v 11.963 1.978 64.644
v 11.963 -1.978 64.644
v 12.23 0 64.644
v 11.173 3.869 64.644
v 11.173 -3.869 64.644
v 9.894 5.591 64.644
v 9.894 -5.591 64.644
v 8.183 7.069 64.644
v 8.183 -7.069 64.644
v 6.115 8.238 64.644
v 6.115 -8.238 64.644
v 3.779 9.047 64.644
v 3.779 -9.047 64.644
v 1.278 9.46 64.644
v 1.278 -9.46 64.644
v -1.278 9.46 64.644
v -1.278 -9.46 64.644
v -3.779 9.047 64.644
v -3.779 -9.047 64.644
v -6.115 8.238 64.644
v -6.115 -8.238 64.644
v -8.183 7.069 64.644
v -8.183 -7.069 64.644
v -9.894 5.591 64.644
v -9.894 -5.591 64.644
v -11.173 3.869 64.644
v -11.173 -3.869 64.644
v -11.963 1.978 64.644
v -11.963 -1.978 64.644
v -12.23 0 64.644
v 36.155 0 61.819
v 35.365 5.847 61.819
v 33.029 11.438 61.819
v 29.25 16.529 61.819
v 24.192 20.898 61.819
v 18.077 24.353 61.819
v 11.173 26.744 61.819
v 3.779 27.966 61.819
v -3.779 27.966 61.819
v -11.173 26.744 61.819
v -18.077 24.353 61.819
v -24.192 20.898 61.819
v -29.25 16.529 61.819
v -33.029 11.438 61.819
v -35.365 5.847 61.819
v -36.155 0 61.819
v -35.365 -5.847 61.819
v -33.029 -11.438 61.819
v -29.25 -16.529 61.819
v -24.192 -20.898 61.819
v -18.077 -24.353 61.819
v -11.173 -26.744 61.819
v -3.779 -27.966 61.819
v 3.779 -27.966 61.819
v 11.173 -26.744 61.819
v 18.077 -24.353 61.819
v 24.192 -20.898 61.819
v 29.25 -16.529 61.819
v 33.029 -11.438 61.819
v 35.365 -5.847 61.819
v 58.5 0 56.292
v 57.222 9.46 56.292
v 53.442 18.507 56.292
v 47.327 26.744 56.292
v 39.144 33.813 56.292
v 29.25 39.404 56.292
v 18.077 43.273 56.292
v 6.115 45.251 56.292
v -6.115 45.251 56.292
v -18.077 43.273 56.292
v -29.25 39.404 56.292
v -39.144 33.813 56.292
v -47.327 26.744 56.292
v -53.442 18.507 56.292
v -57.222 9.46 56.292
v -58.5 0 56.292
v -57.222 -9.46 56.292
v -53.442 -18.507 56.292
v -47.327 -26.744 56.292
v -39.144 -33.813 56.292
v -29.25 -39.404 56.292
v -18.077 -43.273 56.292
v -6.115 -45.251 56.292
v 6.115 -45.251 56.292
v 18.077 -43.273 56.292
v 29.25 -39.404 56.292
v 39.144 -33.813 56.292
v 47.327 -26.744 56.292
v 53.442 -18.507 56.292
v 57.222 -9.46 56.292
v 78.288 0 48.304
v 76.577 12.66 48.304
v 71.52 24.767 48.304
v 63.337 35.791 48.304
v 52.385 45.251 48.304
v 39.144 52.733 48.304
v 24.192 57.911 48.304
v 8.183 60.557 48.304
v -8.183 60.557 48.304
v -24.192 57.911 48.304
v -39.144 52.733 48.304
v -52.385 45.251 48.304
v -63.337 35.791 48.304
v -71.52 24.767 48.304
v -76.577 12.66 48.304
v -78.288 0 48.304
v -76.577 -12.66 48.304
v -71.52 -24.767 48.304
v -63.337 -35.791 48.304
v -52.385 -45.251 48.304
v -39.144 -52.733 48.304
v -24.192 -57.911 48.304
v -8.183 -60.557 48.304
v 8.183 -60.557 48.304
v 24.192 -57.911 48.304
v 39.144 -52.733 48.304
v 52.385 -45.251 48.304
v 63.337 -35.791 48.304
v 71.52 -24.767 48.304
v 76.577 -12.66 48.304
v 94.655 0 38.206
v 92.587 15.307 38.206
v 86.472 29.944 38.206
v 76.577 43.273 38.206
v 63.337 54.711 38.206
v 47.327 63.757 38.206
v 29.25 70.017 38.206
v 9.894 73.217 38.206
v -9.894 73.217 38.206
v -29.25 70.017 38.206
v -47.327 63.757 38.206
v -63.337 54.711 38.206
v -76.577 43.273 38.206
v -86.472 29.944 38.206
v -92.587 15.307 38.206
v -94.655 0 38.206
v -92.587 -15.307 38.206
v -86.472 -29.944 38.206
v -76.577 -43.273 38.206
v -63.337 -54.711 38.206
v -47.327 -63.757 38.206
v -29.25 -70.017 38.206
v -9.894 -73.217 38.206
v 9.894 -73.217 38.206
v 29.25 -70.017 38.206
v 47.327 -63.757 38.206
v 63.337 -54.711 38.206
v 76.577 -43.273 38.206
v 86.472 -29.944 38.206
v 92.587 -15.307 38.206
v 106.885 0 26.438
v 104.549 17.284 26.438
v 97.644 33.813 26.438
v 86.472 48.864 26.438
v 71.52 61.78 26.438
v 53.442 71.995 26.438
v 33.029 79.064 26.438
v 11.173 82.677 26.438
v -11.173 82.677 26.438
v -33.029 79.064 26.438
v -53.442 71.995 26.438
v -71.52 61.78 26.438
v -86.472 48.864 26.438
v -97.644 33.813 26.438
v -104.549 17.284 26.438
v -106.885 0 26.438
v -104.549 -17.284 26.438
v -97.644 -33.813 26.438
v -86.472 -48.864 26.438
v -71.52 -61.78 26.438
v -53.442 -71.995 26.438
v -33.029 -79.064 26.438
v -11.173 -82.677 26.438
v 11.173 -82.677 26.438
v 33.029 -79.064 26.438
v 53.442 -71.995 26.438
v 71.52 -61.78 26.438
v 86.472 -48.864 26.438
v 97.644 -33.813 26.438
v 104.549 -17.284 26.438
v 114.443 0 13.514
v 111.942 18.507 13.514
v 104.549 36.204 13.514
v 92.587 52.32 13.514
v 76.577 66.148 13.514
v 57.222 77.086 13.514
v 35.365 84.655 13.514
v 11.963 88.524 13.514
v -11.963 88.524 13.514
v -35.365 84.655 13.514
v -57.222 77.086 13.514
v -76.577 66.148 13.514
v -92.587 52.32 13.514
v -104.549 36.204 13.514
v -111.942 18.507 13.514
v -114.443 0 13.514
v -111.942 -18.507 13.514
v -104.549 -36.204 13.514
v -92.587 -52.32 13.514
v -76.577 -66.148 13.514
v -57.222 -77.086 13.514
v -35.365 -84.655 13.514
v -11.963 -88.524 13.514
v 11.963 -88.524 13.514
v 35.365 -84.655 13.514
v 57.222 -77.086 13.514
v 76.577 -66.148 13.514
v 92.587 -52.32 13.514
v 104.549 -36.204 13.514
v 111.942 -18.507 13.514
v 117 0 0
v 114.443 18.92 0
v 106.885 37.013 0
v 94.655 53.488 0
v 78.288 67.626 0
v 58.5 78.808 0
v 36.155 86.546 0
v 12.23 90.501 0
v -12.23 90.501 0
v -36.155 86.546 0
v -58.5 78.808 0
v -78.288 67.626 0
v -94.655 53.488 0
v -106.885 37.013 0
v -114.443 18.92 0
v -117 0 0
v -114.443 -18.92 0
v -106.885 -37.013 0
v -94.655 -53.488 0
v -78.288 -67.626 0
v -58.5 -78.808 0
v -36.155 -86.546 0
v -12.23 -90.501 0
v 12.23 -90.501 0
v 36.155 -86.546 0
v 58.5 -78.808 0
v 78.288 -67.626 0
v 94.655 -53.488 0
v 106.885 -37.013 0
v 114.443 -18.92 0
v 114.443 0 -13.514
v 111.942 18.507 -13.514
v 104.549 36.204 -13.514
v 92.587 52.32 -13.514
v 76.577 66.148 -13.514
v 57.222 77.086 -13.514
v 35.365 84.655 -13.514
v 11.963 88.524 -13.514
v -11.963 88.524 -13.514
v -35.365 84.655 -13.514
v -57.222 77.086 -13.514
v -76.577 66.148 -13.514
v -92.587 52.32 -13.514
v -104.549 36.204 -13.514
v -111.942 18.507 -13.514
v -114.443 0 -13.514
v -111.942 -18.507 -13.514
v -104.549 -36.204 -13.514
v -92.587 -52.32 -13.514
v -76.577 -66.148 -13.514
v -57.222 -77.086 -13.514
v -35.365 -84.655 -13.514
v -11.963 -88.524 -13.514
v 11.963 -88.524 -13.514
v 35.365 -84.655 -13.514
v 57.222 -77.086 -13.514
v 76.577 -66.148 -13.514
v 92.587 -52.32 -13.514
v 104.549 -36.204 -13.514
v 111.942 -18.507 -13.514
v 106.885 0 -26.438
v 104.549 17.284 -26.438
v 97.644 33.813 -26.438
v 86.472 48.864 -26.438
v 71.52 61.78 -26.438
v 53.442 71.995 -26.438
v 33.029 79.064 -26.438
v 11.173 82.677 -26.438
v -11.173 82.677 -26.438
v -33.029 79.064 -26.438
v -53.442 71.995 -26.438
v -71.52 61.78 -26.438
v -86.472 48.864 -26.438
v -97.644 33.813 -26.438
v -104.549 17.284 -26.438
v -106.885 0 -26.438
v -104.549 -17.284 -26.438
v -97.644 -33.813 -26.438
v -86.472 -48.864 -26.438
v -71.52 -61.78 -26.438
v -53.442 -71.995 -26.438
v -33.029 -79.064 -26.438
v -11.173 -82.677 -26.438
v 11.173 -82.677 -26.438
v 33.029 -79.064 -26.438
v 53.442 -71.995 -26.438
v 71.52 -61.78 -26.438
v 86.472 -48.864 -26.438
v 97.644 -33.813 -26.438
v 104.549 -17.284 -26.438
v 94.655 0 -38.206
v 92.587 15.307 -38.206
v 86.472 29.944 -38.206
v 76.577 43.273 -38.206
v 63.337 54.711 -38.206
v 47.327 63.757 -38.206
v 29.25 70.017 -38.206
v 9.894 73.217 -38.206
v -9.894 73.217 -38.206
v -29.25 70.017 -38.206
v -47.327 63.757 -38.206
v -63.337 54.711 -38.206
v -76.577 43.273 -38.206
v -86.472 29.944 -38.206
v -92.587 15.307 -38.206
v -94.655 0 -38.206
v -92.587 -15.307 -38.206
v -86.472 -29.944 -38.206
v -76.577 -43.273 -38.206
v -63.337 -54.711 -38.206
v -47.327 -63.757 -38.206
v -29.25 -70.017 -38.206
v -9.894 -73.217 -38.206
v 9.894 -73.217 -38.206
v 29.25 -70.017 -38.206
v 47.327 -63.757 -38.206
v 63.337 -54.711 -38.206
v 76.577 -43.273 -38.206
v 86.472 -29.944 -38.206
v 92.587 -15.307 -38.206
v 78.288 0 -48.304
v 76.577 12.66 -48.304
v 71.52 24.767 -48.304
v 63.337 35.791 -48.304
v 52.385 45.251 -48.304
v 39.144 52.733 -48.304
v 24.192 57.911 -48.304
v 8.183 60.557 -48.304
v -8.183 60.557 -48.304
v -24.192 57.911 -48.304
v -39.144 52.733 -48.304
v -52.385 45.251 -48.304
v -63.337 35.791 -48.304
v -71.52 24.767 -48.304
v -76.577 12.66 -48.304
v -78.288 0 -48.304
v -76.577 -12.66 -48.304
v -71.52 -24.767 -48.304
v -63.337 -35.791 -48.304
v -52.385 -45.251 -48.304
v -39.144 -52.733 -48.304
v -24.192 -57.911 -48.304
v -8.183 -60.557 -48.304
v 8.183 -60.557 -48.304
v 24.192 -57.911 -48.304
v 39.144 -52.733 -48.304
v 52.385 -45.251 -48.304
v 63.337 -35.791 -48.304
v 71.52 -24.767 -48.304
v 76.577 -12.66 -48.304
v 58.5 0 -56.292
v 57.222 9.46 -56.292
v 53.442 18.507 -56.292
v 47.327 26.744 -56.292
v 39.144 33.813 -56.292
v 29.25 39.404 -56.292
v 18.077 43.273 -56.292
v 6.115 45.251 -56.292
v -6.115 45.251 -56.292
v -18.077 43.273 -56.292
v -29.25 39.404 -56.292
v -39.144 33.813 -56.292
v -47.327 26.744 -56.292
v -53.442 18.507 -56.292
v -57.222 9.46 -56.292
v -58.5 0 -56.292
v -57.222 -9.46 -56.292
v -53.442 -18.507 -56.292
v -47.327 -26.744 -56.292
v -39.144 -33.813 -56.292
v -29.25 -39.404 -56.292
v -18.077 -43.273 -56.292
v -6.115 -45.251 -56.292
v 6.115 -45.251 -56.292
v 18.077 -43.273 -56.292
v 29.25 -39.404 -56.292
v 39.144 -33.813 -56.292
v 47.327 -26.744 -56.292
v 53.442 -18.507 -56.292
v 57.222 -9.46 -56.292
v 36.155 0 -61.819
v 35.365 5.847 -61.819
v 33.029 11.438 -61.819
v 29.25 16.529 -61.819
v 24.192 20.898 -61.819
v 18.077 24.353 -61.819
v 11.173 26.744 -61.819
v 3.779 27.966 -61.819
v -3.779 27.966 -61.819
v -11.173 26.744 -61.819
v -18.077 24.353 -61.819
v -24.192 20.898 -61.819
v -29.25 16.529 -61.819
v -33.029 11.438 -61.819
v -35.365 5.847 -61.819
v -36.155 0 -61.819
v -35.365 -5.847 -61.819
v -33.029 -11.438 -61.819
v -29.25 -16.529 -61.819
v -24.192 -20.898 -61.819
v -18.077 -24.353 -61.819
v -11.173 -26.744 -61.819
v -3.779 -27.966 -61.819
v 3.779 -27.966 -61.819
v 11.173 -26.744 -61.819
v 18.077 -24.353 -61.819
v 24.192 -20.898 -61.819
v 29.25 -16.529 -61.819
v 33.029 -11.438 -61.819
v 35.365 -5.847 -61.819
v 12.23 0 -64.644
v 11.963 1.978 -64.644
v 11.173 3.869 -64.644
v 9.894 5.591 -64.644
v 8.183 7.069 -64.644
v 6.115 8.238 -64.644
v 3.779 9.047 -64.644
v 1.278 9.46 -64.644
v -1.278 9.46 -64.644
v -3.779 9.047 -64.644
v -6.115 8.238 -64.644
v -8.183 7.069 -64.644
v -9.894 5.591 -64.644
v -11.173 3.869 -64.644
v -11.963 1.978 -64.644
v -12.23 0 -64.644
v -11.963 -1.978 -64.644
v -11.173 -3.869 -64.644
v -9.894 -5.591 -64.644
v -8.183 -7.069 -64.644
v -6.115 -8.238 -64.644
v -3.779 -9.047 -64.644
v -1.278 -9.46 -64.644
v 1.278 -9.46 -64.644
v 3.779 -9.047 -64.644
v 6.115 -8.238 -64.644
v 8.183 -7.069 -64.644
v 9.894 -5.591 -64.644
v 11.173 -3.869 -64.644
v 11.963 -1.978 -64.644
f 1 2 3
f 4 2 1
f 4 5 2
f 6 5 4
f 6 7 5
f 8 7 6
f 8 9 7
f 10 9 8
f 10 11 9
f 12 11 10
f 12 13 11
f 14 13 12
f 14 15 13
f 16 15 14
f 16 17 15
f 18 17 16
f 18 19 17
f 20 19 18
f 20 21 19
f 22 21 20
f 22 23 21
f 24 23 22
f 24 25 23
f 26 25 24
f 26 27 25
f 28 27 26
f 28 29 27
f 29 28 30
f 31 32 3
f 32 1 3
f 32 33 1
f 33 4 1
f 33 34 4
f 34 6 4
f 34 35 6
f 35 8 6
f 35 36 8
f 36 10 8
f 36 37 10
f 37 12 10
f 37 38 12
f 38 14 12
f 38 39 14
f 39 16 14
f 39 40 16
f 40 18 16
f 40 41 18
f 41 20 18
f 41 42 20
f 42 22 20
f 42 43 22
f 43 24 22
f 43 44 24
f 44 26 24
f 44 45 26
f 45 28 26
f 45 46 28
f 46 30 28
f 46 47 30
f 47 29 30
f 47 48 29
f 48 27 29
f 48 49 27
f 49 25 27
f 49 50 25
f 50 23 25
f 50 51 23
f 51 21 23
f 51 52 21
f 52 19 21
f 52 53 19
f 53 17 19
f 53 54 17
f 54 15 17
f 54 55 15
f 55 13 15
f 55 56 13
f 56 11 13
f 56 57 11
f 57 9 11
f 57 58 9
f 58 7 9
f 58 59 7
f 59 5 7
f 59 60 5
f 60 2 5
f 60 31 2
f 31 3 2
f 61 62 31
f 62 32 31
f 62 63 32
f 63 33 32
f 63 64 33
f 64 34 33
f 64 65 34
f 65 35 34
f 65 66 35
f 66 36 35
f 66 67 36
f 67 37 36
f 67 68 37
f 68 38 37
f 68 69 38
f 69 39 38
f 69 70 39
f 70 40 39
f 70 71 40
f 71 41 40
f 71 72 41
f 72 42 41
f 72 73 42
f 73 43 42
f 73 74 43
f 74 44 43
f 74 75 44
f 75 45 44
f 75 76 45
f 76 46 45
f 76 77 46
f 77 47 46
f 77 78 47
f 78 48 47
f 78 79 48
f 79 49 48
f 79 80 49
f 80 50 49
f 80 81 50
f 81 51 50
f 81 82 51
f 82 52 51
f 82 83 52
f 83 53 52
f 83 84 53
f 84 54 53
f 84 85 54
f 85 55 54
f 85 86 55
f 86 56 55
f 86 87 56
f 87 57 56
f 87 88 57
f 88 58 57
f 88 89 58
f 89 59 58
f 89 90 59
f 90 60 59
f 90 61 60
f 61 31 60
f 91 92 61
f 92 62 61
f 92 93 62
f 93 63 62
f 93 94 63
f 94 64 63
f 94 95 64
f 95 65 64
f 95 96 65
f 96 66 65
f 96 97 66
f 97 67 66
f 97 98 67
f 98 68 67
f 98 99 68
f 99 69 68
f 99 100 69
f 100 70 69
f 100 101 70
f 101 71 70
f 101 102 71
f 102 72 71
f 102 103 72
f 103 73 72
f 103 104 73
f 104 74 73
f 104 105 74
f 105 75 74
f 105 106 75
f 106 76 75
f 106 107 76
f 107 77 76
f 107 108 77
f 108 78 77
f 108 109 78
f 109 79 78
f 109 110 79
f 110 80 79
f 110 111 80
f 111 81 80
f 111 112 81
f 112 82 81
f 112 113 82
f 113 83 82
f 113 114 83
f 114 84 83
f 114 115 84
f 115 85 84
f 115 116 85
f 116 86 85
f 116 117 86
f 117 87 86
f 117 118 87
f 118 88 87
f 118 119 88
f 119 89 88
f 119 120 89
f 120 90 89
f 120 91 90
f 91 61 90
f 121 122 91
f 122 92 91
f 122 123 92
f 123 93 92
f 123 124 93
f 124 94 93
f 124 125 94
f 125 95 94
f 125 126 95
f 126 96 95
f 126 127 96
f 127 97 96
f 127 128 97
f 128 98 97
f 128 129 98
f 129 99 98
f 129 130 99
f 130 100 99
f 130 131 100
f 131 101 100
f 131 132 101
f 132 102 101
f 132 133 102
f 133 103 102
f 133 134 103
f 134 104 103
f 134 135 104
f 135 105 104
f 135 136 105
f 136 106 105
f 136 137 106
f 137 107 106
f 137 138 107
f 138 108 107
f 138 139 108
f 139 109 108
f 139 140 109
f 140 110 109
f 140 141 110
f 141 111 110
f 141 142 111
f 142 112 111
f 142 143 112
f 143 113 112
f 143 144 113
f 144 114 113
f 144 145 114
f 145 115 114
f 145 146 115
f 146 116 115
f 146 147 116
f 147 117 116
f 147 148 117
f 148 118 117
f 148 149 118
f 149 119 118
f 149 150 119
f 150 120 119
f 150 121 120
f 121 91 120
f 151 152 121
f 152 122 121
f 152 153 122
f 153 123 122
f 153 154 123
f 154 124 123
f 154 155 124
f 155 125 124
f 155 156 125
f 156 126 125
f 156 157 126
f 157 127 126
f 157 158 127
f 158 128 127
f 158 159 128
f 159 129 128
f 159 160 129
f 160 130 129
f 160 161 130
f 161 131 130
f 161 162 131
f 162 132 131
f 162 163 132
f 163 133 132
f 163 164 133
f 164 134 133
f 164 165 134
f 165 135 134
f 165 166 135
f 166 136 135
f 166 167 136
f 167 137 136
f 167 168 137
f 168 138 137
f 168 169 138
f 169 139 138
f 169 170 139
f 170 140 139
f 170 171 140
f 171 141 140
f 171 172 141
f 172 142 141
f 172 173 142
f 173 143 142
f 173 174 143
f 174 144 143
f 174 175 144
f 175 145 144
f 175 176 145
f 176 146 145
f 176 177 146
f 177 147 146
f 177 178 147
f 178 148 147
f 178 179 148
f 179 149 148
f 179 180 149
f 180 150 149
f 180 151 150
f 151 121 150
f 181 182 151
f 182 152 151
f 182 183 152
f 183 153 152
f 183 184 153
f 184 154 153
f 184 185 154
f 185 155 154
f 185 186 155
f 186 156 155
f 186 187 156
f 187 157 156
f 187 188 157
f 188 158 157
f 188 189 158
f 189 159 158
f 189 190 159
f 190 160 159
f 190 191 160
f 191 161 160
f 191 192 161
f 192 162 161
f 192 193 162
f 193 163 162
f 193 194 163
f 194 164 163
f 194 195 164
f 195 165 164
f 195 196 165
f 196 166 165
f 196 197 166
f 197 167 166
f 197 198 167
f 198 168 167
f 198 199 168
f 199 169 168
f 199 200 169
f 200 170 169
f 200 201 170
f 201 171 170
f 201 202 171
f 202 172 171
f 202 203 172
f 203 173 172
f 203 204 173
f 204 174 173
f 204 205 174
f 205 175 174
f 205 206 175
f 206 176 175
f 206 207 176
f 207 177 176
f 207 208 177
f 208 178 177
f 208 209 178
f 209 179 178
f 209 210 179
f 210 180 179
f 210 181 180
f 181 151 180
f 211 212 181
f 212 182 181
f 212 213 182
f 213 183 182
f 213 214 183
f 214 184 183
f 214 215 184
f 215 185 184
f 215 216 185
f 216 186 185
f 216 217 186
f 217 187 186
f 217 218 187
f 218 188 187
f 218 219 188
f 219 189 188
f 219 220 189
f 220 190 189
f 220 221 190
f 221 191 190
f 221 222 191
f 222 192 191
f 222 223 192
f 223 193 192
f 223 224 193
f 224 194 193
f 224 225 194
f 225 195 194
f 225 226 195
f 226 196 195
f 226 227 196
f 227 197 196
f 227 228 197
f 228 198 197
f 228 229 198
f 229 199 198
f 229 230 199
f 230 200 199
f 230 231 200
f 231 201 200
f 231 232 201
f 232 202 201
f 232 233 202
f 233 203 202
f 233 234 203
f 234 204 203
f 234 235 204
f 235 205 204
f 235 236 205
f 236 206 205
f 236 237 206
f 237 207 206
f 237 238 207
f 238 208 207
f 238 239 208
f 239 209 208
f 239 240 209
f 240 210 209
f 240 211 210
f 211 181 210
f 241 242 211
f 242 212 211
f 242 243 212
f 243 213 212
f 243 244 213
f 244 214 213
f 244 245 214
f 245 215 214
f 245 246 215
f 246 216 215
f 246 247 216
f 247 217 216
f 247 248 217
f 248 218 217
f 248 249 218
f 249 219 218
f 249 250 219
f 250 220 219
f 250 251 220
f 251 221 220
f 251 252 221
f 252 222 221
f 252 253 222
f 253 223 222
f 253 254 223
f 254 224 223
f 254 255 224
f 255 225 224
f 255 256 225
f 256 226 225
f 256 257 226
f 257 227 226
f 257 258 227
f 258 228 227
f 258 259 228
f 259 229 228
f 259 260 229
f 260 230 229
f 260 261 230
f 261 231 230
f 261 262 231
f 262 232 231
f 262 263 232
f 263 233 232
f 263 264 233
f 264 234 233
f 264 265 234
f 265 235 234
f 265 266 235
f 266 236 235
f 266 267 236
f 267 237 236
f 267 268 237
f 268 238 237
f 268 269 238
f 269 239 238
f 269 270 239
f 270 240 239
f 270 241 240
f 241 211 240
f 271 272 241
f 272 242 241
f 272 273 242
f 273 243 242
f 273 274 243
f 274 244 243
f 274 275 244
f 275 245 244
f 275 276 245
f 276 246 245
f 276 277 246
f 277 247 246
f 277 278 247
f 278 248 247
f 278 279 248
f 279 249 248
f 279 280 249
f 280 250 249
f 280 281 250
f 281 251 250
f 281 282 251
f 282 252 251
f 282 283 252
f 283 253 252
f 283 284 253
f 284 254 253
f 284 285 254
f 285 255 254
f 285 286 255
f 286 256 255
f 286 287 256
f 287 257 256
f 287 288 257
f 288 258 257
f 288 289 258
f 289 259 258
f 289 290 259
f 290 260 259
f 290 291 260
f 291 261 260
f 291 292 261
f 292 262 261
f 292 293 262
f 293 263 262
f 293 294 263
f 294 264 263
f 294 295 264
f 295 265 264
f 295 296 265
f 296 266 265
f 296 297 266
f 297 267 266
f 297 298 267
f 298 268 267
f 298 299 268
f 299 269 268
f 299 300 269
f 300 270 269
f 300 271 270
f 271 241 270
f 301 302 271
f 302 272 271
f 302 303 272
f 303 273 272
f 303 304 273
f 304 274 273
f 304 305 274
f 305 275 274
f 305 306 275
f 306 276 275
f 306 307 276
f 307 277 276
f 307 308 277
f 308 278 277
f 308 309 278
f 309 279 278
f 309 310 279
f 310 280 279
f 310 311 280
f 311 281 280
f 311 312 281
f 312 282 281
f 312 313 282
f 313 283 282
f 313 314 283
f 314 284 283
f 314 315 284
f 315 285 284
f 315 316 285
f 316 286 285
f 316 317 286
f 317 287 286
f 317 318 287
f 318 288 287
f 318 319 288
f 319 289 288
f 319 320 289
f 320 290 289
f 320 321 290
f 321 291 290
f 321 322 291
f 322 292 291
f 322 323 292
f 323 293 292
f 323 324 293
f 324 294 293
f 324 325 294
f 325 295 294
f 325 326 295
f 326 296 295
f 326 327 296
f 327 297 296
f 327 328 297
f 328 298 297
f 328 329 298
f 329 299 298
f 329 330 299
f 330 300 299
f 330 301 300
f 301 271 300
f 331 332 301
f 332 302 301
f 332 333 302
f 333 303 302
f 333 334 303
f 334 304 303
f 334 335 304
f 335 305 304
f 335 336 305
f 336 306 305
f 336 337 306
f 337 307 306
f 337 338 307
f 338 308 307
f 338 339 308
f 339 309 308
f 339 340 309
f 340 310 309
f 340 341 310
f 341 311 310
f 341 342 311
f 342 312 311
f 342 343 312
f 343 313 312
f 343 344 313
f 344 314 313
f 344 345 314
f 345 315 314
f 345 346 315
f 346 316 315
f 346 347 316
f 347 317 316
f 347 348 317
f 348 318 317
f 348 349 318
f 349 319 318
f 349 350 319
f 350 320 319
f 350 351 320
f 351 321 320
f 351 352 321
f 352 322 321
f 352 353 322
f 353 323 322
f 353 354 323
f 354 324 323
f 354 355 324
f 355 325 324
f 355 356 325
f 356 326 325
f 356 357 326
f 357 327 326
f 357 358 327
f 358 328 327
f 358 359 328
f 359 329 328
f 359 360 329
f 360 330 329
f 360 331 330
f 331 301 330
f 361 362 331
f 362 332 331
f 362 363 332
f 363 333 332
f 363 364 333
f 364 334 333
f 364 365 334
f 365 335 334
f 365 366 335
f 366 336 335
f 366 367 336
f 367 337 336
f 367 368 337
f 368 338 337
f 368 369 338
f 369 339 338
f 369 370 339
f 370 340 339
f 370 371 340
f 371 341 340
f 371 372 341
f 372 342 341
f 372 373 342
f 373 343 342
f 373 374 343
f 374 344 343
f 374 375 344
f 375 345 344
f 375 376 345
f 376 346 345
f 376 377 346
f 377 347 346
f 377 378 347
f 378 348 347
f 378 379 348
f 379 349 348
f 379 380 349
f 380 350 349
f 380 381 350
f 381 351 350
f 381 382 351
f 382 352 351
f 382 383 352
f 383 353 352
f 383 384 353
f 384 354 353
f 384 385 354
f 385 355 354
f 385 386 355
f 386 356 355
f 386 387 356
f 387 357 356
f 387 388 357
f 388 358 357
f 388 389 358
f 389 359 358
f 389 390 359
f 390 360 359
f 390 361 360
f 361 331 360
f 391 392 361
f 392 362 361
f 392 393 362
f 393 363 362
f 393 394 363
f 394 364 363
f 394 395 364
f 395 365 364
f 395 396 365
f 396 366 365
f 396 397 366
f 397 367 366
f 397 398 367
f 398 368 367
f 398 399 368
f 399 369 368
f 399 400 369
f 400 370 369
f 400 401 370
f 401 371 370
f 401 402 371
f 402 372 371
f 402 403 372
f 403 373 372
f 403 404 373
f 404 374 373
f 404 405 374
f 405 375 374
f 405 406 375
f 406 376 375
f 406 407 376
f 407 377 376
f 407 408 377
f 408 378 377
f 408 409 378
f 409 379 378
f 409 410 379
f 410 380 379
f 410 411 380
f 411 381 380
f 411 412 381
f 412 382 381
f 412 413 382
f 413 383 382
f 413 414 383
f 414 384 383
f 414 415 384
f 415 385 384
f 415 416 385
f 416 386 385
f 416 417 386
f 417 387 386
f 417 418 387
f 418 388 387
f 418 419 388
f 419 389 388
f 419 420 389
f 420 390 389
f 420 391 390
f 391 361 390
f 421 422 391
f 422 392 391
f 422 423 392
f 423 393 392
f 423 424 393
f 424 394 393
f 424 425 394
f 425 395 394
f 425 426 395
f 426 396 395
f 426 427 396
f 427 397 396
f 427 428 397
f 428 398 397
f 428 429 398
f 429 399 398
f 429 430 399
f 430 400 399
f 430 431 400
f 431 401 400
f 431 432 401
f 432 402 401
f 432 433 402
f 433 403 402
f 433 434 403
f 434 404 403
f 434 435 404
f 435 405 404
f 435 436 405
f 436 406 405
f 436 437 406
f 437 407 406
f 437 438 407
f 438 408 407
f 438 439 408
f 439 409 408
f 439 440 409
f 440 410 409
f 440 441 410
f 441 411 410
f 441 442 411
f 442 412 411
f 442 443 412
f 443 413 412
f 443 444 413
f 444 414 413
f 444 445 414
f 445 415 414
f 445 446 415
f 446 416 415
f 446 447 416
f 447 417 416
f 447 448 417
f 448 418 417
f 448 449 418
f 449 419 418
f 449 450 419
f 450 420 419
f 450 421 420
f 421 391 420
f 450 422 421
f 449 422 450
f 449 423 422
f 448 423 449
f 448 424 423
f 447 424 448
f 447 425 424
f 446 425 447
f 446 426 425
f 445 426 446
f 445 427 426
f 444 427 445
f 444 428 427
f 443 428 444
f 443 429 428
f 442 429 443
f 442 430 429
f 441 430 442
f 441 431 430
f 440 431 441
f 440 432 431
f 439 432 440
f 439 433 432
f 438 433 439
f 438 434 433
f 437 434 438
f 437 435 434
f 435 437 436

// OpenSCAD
// Generated by SolidPython 1.0.1 on 2020-07-29 00:46:48


scale(v = [9, 7, 5]) {
	sphere(r = 13);
}
/***********************************************
*********      SolidPython code:      **********
************************************************
 
# import packages: SolidPython
from solid import *
from solid.utils import *
from itertools import chain, combinations, permutations


class Resize:

    def __init__(self, scad_file):
        self.scad_file = scad_file
        #self.scad_file = import_scad(scad_file)
        # cone/cylinder param:
        self.r1 = 0
        self.r2 = 0
        self.h = 0
        # rectangular prism param:
        self.w = 0
        self.l = 0
        # ellipse param:
        self.r = 0

    # import OpenScad code (file name corresponds to shape)


    # classify shape + parameters
    def assign(self, param1, param2, param3):
        if self.scad_file == 'cone.scad':
            self.r1 = param1
            self.r2 = param2
            self.h = param3
        elif self.scad_file == 'cylinder.scad':
            self.r1 = param1
            self.r2 = param2
            self.h = param3
        elif self.scad_file == 'rectangularPrism.scad':
            self.h = param1
            self.l = param2
            self.w = param3
        else:
            self.r = param1
            self.h = param2

    # resize parameters
    def iterate(self):
        x = range(3, 20, 2)
        i = 1
        if self.scad_file == 'cone.scad':
            tempList = list(permutations(x, 2))
            for temp in tempList:
                param1 = temp[0]
                param2 = temp[1]
                filepath = 'produced_scad_files/' + 'cone' + str(param1) + '_' + str(param2) + '_' + '.scad'
                scad_render_to_file(cylinder(h=param1, r1=param2, r2=0), filepath)

        elif self.scad_file == 'cylinder.scad':
            tempList = list(permutations(x, 3))
            for temp in tempList:
                param1 = temp[0]
                param2 = temp[1]
                filepath = 'produced_scad_files/' + 'cylinder' + str(param1) + '_' + str(param2) + '_' + '.scad'
                scad_render_to_file(cylinder(h=param1, r1=param2, r2=param2), filepath)

        elif self.scad_file == 'rectangularPrism.scad':
            tempList = list(permutations(x, 3))
            for temp in tempList:
                param1 = temp[0]
                param2 = temp[1]
                param3 = temp[2]
                filepath = 'produced_scad_files/' + 'rectangularPrism' + str(param1) + '_' + str(param2) + '_' + str(
                    param3) + '.scad'
                scad_render_to_file(cube(size=(param1, param2, param3)), filepath)

        elif self.scad_file == 'ellipse.scad':
            tempList = list(permutations(x, 4))
            for temp in tempList:
                param1 = temp[0]
                param2 = temp[1]
                param3 = temp[2]
                param4 = temp[3]
                filepath = 'produced_scad_files/' + 'ellipse' + str(param1) + '_' + str(param2) + '_' + str(param3) + '_' + str(param4) + '.scad'
                scad_render_to_file(scale([param1, param2, param3])(sphere(r=param4)), filepath)

    def render_to_scadfile(self):
        scad_render_to_file(scad, 'example.scad') 
 
************************************************/
